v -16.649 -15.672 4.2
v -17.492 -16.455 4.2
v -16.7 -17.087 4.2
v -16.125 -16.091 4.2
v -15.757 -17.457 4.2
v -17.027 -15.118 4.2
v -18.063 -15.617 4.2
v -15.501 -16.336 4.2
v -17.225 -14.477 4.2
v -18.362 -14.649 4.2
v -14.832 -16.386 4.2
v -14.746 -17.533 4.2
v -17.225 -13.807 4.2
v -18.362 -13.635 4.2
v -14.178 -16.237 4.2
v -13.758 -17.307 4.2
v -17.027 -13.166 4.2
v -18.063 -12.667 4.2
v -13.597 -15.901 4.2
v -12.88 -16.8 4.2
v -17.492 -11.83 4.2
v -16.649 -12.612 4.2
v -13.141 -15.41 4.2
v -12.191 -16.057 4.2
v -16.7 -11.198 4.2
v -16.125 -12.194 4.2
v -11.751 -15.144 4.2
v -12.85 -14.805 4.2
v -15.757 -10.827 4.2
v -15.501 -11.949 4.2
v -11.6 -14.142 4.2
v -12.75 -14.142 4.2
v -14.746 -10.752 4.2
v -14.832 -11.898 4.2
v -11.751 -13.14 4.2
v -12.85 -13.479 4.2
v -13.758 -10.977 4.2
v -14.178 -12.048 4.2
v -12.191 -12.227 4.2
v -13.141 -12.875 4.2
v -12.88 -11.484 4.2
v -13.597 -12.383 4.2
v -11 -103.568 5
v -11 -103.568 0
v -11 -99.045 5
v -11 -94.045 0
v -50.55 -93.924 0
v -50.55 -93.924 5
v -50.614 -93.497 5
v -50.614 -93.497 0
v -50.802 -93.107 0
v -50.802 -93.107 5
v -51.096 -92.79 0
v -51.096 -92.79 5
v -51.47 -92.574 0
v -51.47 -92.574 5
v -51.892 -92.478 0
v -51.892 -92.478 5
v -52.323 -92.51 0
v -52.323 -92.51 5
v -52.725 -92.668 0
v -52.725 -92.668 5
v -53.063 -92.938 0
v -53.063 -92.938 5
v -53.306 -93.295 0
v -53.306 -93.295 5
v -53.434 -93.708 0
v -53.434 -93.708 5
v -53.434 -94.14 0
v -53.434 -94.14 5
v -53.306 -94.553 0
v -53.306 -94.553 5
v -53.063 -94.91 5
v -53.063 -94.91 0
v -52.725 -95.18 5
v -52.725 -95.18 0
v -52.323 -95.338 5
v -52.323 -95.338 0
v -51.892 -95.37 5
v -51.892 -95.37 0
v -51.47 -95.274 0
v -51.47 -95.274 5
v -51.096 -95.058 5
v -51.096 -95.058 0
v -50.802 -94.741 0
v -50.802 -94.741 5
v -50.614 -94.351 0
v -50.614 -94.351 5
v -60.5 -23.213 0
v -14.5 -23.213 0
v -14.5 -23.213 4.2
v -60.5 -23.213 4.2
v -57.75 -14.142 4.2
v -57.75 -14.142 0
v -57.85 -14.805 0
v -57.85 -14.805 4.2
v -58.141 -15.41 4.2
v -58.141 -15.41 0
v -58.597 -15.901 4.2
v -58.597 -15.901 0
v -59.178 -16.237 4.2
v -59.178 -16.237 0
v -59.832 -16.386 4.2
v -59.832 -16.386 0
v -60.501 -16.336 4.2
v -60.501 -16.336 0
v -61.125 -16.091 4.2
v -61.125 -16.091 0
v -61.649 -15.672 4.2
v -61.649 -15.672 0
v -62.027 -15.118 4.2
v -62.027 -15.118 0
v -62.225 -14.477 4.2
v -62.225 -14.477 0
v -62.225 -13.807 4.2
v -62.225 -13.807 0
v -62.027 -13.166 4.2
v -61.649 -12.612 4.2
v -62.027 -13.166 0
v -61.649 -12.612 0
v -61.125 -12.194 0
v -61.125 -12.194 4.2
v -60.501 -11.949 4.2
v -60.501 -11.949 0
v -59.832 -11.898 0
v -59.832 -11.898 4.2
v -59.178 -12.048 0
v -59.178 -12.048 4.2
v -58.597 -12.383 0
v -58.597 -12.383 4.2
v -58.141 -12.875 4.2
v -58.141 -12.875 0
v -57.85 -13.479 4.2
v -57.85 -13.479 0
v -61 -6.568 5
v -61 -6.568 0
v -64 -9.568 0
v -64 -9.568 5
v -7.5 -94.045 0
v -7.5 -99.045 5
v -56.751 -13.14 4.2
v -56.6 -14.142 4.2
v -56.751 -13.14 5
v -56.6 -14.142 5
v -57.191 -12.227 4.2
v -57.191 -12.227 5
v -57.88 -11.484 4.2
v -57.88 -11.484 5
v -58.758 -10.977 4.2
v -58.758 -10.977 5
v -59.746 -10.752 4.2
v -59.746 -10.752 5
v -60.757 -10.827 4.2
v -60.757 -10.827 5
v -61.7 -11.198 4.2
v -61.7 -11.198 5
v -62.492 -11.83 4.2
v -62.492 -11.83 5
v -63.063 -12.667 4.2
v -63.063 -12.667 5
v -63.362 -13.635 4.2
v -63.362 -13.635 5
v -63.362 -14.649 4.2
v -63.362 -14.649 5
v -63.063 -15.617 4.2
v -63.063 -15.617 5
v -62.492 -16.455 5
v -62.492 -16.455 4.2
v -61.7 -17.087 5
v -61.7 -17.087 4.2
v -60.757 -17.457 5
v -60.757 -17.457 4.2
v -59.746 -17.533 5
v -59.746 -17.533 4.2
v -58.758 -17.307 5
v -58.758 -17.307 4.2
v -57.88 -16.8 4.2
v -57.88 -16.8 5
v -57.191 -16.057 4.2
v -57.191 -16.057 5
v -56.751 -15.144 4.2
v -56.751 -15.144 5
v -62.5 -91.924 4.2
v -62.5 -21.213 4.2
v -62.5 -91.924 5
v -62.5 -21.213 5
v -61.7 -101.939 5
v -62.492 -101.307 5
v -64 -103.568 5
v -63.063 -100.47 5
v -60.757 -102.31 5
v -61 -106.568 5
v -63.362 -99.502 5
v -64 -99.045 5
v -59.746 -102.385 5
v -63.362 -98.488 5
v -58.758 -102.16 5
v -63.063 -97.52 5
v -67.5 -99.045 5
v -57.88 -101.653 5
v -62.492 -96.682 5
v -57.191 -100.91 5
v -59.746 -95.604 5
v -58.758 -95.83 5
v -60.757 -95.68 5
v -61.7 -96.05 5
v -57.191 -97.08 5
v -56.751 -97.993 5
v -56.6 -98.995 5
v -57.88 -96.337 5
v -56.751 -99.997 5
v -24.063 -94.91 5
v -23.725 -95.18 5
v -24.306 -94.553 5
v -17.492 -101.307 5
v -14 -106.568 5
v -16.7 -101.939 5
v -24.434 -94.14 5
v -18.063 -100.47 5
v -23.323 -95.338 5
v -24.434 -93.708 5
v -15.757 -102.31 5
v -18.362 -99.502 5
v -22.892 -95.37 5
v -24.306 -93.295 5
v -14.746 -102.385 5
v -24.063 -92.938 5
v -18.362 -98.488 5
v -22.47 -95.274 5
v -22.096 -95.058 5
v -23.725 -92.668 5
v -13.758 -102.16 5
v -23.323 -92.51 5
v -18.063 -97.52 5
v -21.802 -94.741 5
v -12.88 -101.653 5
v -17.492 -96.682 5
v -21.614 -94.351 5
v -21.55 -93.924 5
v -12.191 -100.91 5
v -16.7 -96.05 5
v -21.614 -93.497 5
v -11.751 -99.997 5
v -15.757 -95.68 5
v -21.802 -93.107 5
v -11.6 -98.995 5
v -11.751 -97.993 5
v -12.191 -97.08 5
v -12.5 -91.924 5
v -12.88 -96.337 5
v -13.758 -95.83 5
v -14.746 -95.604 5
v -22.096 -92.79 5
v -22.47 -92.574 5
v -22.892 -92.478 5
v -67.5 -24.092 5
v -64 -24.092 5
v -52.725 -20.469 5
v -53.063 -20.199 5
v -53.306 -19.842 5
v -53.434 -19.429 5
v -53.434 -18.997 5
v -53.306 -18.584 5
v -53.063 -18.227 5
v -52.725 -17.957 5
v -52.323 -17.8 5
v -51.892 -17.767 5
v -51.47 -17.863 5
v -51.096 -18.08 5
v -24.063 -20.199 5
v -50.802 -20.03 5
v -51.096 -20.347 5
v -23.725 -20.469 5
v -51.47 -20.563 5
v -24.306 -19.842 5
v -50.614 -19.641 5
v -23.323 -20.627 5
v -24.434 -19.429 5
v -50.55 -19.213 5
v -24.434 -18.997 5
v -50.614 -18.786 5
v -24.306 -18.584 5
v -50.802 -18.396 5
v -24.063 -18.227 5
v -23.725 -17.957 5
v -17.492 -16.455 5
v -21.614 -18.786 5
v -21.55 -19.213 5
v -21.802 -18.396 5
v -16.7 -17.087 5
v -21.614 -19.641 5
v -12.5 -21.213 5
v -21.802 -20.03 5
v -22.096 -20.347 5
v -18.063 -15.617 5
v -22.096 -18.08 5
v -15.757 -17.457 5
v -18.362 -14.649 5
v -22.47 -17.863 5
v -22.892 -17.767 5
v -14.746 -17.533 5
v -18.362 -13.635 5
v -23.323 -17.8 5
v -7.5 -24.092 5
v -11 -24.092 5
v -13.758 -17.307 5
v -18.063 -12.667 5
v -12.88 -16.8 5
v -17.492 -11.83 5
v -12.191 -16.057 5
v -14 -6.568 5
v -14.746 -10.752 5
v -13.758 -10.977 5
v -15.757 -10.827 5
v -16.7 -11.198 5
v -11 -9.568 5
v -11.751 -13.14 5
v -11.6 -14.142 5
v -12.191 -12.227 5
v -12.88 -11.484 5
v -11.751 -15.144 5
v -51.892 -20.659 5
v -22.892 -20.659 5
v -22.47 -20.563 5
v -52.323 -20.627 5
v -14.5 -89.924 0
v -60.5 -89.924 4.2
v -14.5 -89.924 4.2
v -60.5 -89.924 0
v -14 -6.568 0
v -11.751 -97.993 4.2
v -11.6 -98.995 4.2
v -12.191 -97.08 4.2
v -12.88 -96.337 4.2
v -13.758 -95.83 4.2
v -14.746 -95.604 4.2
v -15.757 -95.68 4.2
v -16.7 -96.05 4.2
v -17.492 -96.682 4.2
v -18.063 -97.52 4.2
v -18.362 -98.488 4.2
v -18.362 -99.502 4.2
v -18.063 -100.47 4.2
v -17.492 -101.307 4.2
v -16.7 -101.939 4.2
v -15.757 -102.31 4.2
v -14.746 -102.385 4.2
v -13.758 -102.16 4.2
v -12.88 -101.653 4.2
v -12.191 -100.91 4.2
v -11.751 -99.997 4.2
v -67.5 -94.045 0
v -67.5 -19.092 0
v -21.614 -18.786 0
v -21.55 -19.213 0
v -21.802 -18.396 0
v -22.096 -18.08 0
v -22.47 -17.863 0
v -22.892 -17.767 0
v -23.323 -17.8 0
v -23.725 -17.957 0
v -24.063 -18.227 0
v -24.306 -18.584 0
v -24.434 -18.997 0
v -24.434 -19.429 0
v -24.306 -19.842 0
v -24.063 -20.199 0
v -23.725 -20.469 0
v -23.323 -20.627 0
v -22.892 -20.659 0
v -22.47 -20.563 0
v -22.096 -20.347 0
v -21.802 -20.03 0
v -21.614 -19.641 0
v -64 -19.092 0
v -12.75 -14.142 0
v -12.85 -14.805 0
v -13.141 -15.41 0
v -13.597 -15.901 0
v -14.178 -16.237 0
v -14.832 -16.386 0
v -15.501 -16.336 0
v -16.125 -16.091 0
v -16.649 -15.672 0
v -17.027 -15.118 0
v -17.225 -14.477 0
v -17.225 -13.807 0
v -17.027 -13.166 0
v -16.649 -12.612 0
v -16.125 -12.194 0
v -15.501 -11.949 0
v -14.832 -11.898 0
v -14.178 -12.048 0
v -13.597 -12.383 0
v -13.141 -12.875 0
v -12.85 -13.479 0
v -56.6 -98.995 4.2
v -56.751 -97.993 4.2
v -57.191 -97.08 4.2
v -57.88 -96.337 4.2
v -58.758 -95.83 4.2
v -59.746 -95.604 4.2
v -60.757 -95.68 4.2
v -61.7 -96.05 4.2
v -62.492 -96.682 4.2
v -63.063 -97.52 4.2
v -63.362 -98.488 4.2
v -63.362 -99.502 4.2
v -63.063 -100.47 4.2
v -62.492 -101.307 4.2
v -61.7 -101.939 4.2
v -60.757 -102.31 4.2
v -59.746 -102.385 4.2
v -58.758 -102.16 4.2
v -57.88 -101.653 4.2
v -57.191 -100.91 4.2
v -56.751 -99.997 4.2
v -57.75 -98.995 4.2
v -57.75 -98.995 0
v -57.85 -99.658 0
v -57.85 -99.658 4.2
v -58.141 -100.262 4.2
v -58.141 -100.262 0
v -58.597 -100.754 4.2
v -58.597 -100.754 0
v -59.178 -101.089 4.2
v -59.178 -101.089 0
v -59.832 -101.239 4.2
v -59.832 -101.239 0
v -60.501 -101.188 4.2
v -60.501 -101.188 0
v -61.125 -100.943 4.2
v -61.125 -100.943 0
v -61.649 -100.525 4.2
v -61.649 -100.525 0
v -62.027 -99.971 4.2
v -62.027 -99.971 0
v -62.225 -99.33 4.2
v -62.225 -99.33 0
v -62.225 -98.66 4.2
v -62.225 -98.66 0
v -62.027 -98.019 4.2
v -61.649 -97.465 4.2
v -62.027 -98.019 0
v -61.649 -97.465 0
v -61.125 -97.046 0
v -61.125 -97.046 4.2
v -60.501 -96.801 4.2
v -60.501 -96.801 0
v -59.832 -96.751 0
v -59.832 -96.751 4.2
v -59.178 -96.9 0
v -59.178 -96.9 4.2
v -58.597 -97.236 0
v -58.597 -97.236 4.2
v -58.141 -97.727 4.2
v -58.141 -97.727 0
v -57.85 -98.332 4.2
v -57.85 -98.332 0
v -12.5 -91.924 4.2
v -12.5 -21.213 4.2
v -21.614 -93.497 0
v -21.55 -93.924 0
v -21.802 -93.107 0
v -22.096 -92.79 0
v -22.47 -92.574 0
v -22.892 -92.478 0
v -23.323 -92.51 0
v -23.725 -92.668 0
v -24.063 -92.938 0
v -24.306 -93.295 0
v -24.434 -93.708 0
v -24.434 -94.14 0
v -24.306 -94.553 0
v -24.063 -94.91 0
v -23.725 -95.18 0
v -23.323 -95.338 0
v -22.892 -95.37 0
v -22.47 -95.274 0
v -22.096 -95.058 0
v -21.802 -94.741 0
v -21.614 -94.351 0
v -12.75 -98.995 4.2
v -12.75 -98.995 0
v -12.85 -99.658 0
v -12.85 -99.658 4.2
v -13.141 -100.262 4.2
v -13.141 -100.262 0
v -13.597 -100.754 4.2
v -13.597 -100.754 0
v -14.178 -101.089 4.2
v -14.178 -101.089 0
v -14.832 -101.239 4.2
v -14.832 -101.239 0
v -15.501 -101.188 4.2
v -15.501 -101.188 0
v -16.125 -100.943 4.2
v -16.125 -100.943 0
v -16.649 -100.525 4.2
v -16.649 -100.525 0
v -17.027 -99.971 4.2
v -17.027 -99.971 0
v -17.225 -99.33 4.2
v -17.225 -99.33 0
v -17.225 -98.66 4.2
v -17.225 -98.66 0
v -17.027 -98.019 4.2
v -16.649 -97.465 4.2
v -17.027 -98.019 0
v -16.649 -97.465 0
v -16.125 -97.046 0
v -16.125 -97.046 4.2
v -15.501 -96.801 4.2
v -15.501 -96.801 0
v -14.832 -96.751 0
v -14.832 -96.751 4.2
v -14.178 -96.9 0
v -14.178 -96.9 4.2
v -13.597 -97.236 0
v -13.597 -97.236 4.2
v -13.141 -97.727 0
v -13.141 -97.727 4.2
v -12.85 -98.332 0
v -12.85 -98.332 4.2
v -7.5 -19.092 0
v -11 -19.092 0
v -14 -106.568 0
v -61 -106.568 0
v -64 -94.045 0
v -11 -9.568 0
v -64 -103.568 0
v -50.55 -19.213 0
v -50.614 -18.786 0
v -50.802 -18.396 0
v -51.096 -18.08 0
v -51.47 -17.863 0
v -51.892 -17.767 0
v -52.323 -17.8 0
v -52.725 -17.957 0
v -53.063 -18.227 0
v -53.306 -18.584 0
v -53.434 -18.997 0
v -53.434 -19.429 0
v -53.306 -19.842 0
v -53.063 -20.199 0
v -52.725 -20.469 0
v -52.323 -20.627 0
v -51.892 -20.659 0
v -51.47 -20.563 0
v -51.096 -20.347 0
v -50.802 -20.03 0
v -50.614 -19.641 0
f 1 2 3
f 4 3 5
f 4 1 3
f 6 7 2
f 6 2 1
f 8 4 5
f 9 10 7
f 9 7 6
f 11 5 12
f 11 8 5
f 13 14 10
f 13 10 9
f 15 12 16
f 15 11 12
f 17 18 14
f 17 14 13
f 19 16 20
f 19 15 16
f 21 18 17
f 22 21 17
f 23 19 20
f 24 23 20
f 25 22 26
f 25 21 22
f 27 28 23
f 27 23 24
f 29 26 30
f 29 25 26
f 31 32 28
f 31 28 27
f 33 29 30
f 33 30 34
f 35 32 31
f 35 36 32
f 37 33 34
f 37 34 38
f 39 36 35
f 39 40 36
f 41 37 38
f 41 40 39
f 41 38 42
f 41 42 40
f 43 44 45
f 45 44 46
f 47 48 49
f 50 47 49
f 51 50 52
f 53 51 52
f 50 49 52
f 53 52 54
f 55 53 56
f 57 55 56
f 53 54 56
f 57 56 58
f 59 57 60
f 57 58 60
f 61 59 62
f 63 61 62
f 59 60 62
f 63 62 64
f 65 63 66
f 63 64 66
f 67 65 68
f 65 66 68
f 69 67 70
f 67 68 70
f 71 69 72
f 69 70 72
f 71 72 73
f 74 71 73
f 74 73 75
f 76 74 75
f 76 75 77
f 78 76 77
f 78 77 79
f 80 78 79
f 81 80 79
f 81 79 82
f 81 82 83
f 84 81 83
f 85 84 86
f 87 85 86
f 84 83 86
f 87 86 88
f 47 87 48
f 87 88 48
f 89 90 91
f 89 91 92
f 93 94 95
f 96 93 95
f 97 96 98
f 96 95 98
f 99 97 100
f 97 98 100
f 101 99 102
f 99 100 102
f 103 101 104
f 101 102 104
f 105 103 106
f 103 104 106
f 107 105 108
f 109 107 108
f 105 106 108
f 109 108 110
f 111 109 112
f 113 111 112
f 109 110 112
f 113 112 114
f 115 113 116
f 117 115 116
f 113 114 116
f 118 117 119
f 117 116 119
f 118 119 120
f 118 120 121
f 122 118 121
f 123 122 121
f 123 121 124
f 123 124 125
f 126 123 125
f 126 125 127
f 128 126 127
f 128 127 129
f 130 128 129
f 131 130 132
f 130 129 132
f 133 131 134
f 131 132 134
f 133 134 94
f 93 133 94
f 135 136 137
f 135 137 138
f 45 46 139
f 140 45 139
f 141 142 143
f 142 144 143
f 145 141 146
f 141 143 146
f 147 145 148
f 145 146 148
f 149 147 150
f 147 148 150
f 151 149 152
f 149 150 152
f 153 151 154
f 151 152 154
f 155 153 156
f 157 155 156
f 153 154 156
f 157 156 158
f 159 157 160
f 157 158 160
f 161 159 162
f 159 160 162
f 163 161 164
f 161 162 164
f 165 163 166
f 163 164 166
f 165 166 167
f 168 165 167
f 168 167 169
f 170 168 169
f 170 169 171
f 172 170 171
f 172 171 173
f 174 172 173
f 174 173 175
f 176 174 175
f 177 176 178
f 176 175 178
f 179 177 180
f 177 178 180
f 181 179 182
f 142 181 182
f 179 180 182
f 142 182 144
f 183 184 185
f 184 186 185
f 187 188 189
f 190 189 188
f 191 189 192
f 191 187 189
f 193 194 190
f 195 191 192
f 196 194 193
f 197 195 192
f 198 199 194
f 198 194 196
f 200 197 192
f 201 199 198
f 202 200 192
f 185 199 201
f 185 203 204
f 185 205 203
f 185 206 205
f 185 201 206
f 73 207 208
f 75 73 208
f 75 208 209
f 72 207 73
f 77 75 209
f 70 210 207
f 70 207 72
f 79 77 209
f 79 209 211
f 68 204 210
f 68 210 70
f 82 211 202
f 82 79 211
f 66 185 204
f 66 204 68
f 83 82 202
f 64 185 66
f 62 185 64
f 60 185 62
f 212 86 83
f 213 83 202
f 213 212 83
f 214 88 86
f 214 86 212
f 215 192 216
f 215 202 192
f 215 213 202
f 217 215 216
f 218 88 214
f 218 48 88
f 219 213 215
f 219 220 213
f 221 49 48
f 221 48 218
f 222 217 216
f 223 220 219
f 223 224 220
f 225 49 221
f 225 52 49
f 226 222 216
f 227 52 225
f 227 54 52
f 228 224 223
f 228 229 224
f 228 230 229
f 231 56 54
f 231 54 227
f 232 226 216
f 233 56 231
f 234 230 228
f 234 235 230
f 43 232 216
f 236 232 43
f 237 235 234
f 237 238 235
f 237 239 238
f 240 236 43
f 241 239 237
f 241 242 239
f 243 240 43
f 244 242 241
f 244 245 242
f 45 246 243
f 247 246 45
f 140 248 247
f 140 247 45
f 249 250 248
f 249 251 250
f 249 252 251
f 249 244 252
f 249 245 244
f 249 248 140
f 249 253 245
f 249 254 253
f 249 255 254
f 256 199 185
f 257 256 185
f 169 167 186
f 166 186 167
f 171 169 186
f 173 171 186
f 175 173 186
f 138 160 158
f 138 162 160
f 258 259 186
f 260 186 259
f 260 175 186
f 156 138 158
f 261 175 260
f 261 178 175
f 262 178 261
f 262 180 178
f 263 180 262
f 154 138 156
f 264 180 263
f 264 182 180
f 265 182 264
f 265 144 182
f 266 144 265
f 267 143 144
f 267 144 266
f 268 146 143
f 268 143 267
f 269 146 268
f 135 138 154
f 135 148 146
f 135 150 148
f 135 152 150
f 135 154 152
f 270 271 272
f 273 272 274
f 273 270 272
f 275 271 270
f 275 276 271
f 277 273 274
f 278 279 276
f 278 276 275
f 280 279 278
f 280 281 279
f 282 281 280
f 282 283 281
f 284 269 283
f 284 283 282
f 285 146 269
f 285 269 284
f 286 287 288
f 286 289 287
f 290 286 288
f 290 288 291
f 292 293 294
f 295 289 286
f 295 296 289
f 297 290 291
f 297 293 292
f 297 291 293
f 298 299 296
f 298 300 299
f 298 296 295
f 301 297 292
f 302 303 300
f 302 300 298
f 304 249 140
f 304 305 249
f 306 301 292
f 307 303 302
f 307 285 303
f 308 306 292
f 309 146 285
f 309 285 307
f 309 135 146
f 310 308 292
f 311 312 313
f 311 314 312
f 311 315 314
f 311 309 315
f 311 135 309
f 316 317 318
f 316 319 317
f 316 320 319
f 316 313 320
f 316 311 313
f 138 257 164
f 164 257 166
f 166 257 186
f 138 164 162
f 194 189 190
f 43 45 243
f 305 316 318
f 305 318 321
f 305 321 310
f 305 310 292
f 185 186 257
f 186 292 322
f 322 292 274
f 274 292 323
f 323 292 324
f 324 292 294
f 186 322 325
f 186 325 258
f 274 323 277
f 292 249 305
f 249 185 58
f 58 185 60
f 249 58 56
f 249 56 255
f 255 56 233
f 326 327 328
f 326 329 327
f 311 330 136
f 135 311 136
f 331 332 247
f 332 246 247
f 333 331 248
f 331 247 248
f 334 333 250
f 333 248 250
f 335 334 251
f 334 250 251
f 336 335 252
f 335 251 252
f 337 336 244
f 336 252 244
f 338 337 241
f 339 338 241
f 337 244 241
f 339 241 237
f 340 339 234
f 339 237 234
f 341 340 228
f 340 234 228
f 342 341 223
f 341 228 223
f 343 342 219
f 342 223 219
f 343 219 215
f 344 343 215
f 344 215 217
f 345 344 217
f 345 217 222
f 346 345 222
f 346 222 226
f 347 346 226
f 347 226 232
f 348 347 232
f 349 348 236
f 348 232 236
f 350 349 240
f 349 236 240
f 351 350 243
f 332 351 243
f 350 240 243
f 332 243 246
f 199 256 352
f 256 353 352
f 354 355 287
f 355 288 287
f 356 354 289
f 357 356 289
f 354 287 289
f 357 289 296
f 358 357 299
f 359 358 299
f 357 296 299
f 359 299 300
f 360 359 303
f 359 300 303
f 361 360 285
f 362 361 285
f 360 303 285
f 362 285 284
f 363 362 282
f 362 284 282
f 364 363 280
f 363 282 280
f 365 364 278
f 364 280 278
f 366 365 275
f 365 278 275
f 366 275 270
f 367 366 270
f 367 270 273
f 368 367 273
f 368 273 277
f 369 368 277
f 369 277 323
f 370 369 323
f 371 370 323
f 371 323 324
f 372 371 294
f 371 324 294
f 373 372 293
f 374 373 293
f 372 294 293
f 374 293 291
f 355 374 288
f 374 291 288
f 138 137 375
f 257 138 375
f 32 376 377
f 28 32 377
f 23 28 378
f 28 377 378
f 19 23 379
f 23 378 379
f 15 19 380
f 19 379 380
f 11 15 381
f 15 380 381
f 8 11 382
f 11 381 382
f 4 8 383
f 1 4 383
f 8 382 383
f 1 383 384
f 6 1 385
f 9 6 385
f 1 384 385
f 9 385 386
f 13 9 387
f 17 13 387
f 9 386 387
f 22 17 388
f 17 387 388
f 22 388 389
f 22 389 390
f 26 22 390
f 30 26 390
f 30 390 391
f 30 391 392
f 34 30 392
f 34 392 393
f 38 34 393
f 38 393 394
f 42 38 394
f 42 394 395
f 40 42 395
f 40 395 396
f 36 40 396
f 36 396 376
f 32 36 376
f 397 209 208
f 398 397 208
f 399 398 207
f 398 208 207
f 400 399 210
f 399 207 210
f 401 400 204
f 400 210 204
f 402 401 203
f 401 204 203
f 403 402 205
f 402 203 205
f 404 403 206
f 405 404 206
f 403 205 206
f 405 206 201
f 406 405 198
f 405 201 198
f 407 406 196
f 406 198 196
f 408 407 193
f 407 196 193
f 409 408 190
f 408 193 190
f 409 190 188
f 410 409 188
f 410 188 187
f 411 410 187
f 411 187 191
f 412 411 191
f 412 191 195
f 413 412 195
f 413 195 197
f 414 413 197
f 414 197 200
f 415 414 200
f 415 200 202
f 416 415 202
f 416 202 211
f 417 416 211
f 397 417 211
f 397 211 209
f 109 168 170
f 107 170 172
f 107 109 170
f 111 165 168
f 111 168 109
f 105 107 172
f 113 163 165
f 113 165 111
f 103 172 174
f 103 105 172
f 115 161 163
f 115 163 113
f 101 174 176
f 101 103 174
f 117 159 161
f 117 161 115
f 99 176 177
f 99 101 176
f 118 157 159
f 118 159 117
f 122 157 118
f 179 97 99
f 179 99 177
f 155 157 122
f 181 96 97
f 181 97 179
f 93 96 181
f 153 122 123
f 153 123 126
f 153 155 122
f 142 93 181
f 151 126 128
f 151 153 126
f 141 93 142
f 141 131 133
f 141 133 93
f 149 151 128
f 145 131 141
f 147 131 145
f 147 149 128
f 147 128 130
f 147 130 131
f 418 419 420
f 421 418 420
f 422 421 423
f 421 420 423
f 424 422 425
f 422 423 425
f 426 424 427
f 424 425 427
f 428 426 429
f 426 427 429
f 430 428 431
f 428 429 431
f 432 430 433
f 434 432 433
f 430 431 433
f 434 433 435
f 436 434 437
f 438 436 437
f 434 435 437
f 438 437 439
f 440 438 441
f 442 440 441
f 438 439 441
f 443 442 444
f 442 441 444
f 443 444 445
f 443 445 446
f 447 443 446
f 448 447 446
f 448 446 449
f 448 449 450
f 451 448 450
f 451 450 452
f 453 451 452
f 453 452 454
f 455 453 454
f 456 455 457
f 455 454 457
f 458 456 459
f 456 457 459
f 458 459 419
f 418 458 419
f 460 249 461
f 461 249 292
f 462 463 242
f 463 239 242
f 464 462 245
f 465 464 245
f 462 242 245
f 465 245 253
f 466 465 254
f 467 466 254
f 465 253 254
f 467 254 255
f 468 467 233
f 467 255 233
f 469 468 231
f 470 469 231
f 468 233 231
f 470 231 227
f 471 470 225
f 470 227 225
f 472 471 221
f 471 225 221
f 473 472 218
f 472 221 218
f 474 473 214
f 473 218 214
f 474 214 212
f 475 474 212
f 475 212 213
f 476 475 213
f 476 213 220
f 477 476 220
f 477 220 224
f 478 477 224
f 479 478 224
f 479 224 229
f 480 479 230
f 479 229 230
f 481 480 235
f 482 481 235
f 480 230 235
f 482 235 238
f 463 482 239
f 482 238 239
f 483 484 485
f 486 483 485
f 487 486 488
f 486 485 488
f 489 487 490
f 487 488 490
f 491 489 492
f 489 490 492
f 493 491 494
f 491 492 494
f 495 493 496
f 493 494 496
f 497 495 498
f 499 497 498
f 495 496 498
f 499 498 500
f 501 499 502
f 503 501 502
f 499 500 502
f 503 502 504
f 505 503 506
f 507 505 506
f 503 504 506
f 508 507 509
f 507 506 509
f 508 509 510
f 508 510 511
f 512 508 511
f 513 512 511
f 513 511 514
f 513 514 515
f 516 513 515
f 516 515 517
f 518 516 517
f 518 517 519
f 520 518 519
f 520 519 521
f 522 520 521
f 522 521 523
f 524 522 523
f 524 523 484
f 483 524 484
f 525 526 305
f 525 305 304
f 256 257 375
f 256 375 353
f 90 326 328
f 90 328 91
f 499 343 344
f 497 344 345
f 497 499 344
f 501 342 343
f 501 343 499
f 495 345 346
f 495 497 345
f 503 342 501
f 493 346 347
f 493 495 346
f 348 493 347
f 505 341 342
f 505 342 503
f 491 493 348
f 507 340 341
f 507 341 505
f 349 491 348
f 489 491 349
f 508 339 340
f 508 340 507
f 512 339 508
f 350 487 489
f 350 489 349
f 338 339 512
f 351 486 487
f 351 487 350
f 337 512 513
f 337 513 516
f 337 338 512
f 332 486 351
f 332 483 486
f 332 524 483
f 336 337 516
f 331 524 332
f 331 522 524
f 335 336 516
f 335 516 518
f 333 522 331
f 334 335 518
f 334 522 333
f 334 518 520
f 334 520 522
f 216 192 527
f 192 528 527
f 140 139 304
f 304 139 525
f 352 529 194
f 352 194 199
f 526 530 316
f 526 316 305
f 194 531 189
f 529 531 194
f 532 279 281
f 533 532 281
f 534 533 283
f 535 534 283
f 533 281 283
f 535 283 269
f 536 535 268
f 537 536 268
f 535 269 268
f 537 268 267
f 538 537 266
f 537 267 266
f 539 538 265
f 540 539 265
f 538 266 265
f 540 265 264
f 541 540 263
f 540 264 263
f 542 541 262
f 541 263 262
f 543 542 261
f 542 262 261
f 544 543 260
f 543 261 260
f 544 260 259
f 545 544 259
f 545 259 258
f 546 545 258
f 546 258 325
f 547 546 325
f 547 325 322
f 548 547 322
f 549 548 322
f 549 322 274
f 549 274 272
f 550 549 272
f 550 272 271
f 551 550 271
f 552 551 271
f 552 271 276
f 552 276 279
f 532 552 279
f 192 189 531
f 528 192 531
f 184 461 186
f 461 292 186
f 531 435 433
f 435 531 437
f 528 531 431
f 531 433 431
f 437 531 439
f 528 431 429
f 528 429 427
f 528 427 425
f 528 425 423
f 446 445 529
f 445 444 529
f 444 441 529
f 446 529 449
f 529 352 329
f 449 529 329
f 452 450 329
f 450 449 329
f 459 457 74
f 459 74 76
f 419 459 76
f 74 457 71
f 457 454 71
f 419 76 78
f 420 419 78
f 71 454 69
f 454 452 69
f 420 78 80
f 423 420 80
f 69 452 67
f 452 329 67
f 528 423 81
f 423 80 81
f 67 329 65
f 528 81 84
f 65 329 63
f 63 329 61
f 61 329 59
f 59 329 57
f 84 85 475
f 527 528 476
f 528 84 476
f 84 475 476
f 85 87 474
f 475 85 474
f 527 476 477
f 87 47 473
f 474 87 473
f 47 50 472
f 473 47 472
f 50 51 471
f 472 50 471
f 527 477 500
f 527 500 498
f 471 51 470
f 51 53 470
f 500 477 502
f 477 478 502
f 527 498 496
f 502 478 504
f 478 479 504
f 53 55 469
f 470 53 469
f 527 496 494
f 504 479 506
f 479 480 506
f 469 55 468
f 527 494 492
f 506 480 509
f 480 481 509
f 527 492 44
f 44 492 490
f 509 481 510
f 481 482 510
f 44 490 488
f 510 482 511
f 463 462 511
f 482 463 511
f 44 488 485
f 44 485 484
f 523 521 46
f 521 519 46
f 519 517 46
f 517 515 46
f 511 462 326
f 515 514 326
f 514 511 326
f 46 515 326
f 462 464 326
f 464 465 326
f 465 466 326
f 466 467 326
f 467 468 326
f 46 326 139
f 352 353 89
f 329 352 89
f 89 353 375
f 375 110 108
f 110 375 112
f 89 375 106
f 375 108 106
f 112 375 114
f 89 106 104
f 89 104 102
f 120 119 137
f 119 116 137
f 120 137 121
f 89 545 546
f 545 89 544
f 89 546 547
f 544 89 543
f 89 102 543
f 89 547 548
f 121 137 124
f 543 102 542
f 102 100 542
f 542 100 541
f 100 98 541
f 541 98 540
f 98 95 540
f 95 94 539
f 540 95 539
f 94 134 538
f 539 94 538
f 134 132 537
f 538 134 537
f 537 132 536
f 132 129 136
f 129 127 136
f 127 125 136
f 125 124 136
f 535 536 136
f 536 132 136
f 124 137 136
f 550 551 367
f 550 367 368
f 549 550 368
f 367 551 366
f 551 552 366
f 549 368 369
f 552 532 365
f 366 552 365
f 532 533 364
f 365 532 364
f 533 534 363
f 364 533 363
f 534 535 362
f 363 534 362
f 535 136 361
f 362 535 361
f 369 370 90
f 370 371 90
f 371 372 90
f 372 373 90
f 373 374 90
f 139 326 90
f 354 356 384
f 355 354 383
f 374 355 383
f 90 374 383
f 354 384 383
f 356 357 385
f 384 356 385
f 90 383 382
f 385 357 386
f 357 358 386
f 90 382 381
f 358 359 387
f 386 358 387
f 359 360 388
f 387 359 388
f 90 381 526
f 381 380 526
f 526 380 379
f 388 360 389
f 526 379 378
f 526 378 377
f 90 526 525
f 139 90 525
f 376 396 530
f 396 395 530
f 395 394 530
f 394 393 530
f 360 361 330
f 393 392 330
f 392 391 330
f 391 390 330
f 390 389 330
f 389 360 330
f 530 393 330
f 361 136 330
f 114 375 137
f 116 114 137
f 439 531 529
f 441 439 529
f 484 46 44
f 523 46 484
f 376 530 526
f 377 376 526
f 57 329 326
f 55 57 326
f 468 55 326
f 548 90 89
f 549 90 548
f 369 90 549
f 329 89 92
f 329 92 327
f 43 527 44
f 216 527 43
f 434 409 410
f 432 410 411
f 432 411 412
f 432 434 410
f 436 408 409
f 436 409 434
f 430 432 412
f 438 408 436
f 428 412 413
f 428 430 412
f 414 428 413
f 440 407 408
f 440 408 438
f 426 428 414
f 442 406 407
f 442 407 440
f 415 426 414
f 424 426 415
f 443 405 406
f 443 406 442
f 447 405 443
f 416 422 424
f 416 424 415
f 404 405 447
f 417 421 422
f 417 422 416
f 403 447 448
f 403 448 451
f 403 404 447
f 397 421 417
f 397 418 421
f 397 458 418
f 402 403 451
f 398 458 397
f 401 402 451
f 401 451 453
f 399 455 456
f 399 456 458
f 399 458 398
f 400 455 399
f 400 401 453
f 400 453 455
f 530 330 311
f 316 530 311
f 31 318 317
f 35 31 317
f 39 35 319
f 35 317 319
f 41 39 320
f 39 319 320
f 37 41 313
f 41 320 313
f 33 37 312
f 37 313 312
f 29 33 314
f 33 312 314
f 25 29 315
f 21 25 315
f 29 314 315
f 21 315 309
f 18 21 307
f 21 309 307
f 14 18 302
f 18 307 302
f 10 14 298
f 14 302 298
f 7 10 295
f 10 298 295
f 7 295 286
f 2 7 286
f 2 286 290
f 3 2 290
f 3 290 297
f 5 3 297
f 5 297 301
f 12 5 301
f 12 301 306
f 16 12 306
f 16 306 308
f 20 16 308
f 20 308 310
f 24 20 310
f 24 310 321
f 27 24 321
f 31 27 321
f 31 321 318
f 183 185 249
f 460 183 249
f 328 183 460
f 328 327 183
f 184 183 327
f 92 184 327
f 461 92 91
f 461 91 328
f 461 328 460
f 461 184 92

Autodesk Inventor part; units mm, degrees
ref_plane "YZ Plane" through (0, 0, 0) normal (1, 0, 0) x (0, 1, 0)
ref_plane "XZ Plane" through (0, 0, 0) normal (0, 1, 0) x (-1, 0, 0)
ref_plane "XY Plane" through (0, 0, 0) normal (0, 0, 1) x (1, 0, 0)
sketch "Szkic1" plane through (0, 0, 0) normal (0, 0, 1) x (1, 0, 0)
  circle A0 centre (-15, -14.1421) radius 2 projected
  circle A1 centre (-60, -14.1421) radius 2 projected
  circle A2 centre (-15, -98.9949) radius 2 projected
  circle A3 centre (-60, -98.9949) radius 2 projected
  line L0 (-75, -84.8528) -> (0, -84.8528) construction
  line L1 (-75, -27.2843) -> (0, -27.2843) construction
  line L2 (-12.5, -21.2132) -> (-62.5, -21.2132) construction
  line L3 (-62.5, -21.2132) -> (-62.5, -91.9239) construction
  line L4 (-62.5, -91.9239) -> (-12.5, -91.9239) construction
  line L5 (-12.5, -91.9239) -> (-12.5, -21.2132) construction
  line L6 (-15, -98.9949) -> (-60, -14.1421) construction
  line L7 (-15, -14.1421) -> (-60, -98.9949) construction
  line L8 (-7.5, -6.5685) -> (-67.5, -6.5685)
  line L9 (-67.5, -6.5685) -> (-67.5, -106.5685)
  line L10 (-67.5, -106.5685) -> (-7.5, -106.5685)
  line L11 (-7.5, -106.5685) -> (-7.5, -6.5685)
  circle A4 centre (-15, -14.1421) radius 2.25
  circle A5 centre (-60, -14.1421) radius 2.25
  circle A6 centre (-60, -98.9949) radius 2.25
  circle A7 centre (-15, -98.9949) radius 2.25
  line L12 (-12.5, -21.2132) -> (-62.5, -21.2132)
  line L13 (-62.5, -21.2132) -> (-62.5, -91.9239)
  line L14 (-62.5, -91.9239) -> (-12.5, -91.9239)
  line L15 (-12.5, -91.9239) -> (-12.5, -21.2132)
  line L16 (-14.5, -23.2132) -> (-60.5, -23.2132)
  line L17 (-60.5, -23.2132) -> (-60.5, -89.9239)
  line L18 (-60.5, -89.9239) -> (-14.5, -89.9239)
  line L19 (-14.5, -89.9239) -> (-14.5, -23.2132)
  ellipse E0 centre (-7.5, -14.1421) end of major axis (-7.5, -18.3848) minor radius 3 projected
  ellipse E1 centre (-67.5, -14.1421) end of major axis (-67.5, -18.3848) minor radius 3 projected
  ellipse E2 centre (-67.5, -98.9949) end of major axis (-67.5, -103.2376) minor radius 3 projected
  ellipse E3 centre (-7.5, -98.9949) end of major axis (-7.5, -103.2376) minor radius 3 projected
  line L20 (-11.5, -94.4949) -> (-11.5, -106.5685)
  line L21 (-11.5, -94.4949) -> (-7.5, -94.4949)
  line L22 (-37.5, -106.5685) -> (-37.5, -6.5685) construction
  line L23 (-63.5, -94.4949) -> (-63.5, -106.5685)
  line L24 (-63.5, -94.4949) -> (-67.5, -94.4949)
  line L25 (-7.5, -56.5685) -> (-67.5, -56.5685) construction
  line L26 (-11.5, -18.6421) -> (-11.5, -6.5685)
  line L27 (-11.5, -18.6421) -> (-7.5, -18.6421)
  line L28 (-63.5, -18.6421) -> (-63.5, -6.5685)
  line L29 (-63.5, -18.6421) -> (-67.5, -18.6421)
  point P0 (0, 0)
  point P1 (-37.5, -56.5685)
  point P2 (-37.5, -91.9239)
  point P3 (-12.5, -56.5685)
  point P4 (-37.5, -56.5685)
  dimension "d0" = 50
  dimension "d1" = 70.7107
  dimension "d2" = 4.5
  dimension "d3" = 2
  dimension "d4" = 60
  dimension "d5" = 100
  dimension "d15" = 4
  dimension "d16" = 4.5
extrude "Wyciągnięcie proste1" add sketch "Szkic1" along normal blind 5 contours L11 E0 L27 L26 L8 | L26 L27 L11 L21 L20 L10 L23 L24 L9 L29 L28 L8 | L11 E0 | L28 L29 L9 E1 L8 | E1 L9 | L11 E3 L10 L20 L21 | L24 L23 L10 L9 E2 | L11 E3 | E2 L9 | L15 L14 L13 L12 picked at (-8.4985, -14.0649) picked at (-66.5015, -14.2193) picked at (-8.4985, -98.9177) picked at (-66.5015, -99.0721)
sketch "Szkic2" plane through (0, 0, 5) normal (0, 0, 1) x (1, 0, 0)
  line L0 (-62.5, -21.2132) -> (-62.5, -91.9239) projected
  line L1 (-12.5, -21.2132) -> (-62.5, -21.2132) construction
  line L2 (-12.5, -91.9239) -> (-12.5, -21.2132) projected
  line L3 (-62.5, -91.9239) -> (-12.5, -91.9239) construction
  line L4 (-12.5, -21.2132) -> (-62.5, -21.2132)
  line L5 (-62.5, -21.2132) -> (-62.5, -91.9239)
  line L6 (-62.5, -91.9239) -> (-12.5, -91.9239)
  line L7 (-12.5, -91.9239) -> (-12.5, -21.2132)
  circle A0 centre (-15, -14.1421) radius 3.4
  circle A1 centre (-60, -14.1421) radius 3.4
  circle A2 centre (-60, -98.9949) radius 3.4
  circle A3 centre (-15, -98.9949) radius 3.4
  point P0 (0, 0)
  dimension "d10" = 6.8
  dimension "d11" = 6.8
extrude "Wyciągnięcie proste2" cut sketch "Szkic2" against normal blind 0.8
chamfer "Faza1" distance 3 angle 45 4 edges at (-7.5, -106.5685, 2.5) (-67.5, -106.5685, 2.5) (-67.5, -6.5685, 2.5) (-7.5, -6.5685, 2.5)
sketch "Szkic3" plane through (0, 0, 5) normal (0, 0, 1) x (1, 0, 0)
  point P0 (0, 0)
ref_plane "Płaszczyzna konstrukcyjna1" through (-7.5, -6.5685, 0) normal (0, 0.7071, -0.7071) x (-1, 0, 0)
sketch "Szkic4" plane through (-7.5, -6.5685, 0) normal (0, 0.7071, -0.7071) x (-1, 0, 0)
  circle A0 centre (0, -65.3553) radius 3 projected
  circle A1 centre (0, -5.3553) radius 3 projected
  circle A2 centre (60, -65.3553) radius 3 projected
  circle A3 centre (60, -5.3553) radius 3 projected
  line L0 (0, -68.5894) -> (0, -2.1213) projected
  line L1 (57, -70.7107) -> (3, -70.7107) projected
  line L2 (3, 3.5355) -> (57, 3.5355) projected
  line L3 (0, -76.8553) -> (3.5, -76.8553)
  line L4 (3.5, -76.8553) -> (3.5, -61.8553)
  line L5 (3.5, -61.8553) -> (0, -61.8553)
  line L6 (0, -61.8553) -> (0, -76.8553)
  line L7 (0, -65.3553) -> (0, -5.3553) construction
  line L8 (0, -5.3553) -> (60, -5.3553) construction
  line L9 (0, -35.3553) -> (60, -35.3553) construction
  line L10 (60, -2.1213) -> (60, -68.5894) construction
  line L11 (30, -70.7107) -> (30, -5.3553) construction
  line L12 (0, 6.1447) -> (3.5, 6.1447)
  line L13 (3.5, 6.1447) -> (3.5, -8.8553)
  line L14 (3.5, -8.8553) -> (0, -8.8553)
  line L15 (0, -8.8553) -> (0, 6.1447)
  line L16 (60, -76.8553) -> (56.5, -76.8553)
  line L17 (56.5, -76.8553) -> (56.5, -61.8553)
  line L18 (56.5, -61.8553) -> (60, -61.8553)
  line L19 (60, -61.8553) -> (60, -76.8553)
  line L20 (56.5, 6.1447) -> (56.5, -8.8553)
  line L21 (60, 6.1447) -> (56.5, 6.1447)
  line L22 (60, -8.8553) -> (60, 6.1447)
  line L23 (56.5, -8.8553) -> (60, -8.8553)
  point P0 (-7.5, 4.6447)
  point P1 (56.5, -70.7107)
  point P2 (0, -8.3553)
  point P3 (0, -8.8553)
  point P4 (0, -2.1213)
  point P5 (0, -2.3553)
  point P6 (3.5, -70.7107)
  point P7 (0, -61.8553)
  point P8 (60, -68.3553)
  point P9 (60, -62.3553)
  point P10 (60, -8.3553)
  point P11 (60, -2.3553)
  point P12 (0, -62.3553)
  point P13 (0, -68.3553)
  dimension "d18" = 3.5
  dimension "d19" = 15
  dimension "d22" = 3.5
extrude "Wyciągnięcie proste3" cut sketch "Szkic4" against normal through all contours A0 L0 | A0 L0 L5 L4 L3 L6 | L20 L21 L22 A3 L23 | L0 A1 L15 L12 L13 L14 | L17 L18 L19 A2 L16 | L0 A1 | A1 L0 | A2 L19 | L22 A3 picked at (1.6278, -64.5387) picked at (59.5353, -64.4698) picked at (59.296, -4.4408)
chamfer "Faza2" distance 3 angle 45 4 edges at (-11, -6.5685, 2.5) (-64, -6.5685, 2.5) (-11, -106.5685, 2.5) (-64, -106.5685, 2.5)
sketch "Szkic5" plane through (0, 0, 5) normal (0, 0, 1) x (1, 0, 0)
  point P0 (0, 0)
sketch "Szkic6" plane through (0, 0, 5) normal (0, 0, 1) x (1, 0, 0)
  circle A0 centre (-52, -19.2132) radius 1.45
  line L0 (-14, -6.5685) -> (-61, -6.5685) construction
  line L1 (-37.5, -6.5685) -> (-37.5, -106.5685) construction
  line L2 (-61, -106.5685) -> (-14, -106.5685) construction
  line L3 (-67.5, -19.0919) -> (-67.5, -94.0452) construction
  line L4 (-67.5, -56.5685) -> (-7.5, -56.5685) construction
  line L5 (-7.5, -94.0452) -> (-7.5, -19.0919) construction
  line L6 (-62.5, -21.2132) -> (-12.5, -21.2132) construction
  line L7 (-64, -9.5685) -> (-64, -24.0919) construction
  circle A1 centre (-23, -19.2132) radius 1.45
  circle A2 centre (-52, -93.9239) radius 1.45
  circle A3 centre (-23, -93.9239) radius 1.45
  point P0 (0, 0)
  dimension "d26" = 2.9
  dimension "d27" = 2
  dimension "d28" = 12
extrude "Wyciągnięcie proste4" cut sketch "Szkic6" against normal through all
properties part number "mirror_bracket"
